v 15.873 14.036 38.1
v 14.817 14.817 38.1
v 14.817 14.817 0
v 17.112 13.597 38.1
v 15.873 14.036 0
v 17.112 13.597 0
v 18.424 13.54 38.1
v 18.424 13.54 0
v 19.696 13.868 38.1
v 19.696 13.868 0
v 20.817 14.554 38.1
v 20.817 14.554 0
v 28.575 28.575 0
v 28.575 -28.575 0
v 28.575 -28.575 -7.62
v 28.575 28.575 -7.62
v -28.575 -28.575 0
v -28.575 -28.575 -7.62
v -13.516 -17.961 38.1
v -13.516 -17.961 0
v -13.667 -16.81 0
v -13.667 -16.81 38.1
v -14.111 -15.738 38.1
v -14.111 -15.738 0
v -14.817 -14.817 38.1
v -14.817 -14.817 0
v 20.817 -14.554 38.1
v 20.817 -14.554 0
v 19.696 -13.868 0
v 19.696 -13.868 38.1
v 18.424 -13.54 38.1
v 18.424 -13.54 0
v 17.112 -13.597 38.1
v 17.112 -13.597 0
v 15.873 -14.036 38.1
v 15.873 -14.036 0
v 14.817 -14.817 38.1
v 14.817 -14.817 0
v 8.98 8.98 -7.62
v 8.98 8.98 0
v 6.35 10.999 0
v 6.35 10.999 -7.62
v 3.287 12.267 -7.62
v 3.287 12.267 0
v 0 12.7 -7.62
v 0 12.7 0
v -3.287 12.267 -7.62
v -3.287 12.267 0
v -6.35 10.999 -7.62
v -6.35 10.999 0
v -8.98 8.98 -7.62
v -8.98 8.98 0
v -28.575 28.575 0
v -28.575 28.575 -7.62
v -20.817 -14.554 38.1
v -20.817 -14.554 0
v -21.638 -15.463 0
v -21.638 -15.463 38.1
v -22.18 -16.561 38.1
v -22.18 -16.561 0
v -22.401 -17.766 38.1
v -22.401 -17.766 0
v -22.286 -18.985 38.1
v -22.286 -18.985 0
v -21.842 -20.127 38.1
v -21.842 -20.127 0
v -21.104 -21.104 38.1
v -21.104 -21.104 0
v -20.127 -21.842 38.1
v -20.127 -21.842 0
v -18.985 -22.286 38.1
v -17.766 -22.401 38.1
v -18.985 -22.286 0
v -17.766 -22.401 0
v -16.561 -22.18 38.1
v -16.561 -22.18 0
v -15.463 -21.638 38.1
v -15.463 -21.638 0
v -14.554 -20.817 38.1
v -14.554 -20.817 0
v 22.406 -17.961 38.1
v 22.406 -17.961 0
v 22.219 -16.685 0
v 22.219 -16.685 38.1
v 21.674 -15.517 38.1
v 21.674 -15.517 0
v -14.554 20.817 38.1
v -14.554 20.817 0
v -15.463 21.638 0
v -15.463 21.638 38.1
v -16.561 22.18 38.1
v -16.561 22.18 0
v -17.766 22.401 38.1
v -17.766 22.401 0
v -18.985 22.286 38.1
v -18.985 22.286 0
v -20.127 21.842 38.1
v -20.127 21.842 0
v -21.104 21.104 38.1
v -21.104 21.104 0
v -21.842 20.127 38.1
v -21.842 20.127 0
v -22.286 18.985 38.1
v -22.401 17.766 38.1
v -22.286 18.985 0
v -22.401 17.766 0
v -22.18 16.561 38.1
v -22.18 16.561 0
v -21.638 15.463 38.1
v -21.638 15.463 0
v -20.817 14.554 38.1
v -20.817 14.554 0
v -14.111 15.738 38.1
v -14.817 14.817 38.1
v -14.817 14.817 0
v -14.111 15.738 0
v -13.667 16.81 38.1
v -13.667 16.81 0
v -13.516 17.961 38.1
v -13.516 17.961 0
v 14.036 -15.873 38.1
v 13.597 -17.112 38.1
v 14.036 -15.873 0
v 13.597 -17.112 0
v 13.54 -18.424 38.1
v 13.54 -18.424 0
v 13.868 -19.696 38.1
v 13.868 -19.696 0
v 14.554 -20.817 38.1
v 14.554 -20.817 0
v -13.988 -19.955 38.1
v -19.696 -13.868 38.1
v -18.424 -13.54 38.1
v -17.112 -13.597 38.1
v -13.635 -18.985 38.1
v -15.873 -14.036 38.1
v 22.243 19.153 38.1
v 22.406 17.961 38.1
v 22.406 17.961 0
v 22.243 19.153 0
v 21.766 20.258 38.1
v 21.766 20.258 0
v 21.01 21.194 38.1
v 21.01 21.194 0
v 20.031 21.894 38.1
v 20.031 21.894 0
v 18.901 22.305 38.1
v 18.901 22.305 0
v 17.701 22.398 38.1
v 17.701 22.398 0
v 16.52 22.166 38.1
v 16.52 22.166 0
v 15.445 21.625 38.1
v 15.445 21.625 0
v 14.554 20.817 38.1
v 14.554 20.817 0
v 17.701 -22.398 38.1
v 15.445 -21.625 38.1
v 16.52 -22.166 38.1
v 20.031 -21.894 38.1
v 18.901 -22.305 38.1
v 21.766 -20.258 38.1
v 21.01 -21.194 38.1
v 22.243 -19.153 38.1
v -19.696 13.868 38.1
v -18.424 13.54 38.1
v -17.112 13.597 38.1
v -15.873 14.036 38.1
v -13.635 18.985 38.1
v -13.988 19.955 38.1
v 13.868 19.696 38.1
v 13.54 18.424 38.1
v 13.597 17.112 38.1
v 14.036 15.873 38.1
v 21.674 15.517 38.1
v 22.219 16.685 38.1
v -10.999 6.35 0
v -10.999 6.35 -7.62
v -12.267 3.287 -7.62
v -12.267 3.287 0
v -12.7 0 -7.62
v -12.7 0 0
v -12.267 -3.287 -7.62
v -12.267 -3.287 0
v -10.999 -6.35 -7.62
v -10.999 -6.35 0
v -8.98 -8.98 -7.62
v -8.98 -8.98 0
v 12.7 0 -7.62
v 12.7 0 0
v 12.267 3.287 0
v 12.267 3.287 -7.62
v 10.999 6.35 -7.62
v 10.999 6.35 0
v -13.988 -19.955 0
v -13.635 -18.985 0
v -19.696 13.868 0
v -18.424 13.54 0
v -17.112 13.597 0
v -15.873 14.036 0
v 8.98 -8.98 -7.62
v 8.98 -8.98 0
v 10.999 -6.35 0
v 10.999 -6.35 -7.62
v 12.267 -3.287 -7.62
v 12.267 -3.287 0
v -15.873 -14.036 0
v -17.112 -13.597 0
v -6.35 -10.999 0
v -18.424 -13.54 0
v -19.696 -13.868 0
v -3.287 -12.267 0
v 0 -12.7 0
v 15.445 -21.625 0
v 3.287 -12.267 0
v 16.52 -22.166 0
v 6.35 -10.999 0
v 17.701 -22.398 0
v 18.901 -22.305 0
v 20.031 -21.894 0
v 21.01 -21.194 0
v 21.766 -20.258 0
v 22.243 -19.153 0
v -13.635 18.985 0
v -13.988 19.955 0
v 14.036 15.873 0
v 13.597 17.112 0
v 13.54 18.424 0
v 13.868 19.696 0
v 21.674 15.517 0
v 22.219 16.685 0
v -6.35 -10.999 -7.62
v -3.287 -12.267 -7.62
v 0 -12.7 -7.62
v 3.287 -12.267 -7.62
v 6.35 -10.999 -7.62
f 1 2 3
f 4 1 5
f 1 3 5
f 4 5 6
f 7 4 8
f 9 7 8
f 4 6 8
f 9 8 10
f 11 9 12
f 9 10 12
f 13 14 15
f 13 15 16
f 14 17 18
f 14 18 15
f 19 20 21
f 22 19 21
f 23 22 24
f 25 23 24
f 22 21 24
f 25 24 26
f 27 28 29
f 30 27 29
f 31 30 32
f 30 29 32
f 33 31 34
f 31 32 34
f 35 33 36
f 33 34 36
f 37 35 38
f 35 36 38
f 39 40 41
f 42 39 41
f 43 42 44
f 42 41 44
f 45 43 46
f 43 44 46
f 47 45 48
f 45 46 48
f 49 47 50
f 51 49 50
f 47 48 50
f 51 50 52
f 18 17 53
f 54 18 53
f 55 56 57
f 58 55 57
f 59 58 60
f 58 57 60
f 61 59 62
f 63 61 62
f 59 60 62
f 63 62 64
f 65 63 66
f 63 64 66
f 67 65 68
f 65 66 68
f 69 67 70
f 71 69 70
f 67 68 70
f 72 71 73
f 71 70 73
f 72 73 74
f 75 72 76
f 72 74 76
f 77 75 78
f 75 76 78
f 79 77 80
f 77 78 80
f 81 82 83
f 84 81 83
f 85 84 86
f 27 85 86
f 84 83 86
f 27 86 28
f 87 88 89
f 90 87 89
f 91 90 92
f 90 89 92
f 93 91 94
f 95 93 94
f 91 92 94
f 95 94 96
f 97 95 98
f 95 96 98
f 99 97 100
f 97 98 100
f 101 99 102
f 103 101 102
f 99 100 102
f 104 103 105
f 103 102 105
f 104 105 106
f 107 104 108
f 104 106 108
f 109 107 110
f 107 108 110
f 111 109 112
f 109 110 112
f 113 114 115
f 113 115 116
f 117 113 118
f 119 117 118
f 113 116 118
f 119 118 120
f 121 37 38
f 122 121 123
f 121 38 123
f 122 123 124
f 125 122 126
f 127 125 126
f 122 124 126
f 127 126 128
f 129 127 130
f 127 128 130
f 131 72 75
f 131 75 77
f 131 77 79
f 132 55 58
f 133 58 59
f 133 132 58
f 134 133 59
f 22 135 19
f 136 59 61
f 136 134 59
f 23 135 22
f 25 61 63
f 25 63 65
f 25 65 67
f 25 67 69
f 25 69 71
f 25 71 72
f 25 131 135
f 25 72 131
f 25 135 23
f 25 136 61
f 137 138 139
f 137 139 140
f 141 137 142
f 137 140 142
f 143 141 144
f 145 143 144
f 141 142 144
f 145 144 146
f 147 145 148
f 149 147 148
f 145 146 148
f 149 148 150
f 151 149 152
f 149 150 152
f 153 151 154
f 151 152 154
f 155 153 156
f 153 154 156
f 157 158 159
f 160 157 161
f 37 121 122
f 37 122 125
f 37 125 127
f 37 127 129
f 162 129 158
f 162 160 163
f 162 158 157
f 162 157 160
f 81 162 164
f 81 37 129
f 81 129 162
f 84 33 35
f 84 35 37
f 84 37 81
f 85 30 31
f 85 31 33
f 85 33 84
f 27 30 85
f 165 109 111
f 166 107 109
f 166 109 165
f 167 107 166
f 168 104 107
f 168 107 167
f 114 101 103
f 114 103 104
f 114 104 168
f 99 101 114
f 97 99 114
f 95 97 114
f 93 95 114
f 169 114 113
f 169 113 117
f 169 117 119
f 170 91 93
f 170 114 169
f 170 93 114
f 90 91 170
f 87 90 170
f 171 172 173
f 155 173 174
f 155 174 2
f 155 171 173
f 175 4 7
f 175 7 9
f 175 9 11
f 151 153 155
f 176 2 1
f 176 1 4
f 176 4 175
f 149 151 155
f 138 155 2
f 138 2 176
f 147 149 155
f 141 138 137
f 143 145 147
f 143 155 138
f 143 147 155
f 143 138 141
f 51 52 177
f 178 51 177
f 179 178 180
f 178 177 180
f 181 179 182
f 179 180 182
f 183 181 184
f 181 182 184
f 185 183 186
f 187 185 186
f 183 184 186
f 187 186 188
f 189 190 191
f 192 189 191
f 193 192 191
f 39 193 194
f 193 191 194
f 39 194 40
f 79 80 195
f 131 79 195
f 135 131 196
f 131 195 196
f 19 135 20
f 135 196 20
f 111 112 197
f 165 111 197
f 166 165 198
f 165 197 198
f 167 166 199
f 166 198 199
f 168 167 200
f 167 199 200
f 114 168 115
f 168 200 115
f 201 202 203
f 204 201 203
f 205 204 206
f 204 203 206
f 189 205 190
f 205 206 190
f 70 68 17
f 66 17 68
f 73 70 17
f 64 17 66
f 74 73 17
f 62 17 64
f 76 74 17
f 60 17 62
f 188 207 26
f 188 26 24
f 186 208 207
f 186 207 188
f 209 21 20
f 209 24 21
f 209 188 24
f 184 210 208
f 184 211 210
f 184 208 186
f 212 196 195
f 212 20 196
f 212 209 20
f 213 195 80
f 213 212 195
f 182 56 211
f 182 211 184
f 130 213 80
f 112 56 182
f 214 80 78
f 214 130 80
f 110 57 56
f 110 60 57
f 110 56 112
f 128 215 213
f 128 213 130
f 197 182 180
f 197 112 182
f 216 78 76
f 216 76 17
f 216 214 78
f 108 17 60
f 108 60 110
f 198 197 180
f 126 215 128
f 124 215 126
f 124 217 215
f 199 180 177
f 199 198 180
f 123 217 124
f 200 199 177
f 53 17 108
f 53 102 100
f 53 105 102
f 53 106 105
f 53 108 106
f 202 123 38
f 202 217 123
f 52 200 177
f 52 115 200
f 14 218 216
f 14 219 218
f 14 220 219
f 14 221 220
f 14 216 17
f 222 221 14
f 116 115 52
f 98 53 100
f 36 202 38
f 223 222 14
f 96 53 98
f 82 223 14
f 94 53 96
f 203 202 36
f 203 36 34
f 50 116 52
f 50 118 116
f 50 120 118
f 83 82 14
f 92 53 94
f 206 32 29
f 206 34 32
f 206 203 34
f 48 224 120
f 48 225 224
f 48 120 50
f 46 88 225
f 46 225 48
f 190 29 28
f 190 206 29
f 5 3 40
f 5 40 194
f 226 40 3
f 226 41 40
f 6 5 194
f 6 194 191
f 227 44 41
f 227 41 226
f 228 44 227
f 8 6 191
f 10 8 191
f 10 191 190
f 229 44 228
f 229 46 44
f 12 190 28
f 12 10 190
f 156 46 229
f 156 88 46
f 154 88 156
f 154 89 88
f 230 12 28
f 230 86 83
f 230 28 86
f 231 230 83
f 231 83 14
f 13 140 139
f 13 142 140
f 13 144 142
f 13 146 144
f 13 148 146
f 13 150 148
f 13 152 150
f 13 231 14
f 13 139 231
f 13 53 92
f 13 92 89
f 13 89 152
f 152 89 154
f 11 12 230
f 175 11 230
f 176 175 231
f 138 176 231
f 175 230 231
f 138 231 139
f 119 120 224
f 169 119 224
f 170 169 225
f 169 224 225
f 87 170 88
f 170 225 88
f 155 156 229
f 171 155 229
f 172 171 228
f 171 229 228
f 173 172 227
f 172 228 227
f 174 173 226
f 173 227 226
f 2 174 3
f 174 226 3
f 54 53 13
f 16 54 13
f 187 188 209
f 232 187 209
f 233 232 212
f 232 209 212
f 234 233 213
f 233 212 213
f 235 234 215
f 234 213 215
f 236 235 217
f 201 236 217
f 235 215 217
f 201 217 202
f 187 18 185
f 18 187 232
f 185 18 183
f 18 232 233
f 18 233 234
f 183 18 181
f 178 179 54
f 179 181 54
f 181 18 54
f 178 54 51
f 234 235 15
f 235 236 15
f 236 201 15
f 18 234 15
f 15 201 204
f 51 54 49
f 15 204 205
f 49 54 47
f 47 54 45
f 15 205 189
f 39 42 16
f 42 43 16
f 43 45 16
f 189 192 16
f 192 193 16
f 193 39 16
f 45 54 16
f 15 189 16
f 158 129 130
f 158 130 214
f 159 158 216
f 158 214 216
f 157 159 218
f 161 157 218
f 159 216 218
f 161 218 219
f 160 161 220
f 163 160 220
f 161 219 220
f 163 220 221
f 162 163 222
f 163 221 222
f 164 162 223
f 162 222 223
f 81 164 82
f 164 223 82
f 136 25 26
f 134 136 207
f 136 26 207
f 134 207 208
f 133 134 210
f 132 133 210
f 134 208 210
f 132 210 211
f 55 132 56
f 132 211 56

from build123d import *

# Parameters (mm, degrees)
F0_W     = 57.15
F0_H     = 57.15
F1_DEPTH = 7.62
F2_DEPTH = 7.62
F3_DEPTH = 38.1


with BuildPart() as f1:
    # F0 (on Top) → F1 (new body)
    with BuildSketch(Plane.XY):
        Rectangle(F0_W, F0_H)
        with BuildLine():
            ThreePointArc((20.8165262819, 14.5544575149), (24.2270485982, 7.6295554405), (25.4, 0))
            ThreePointArc((25.4, 0), (24.2270485982, -7.6295554405), (20.8165262819, -14.5544575149))
            ThreePointArc((20.8165262819, -14.5544575149), (21.9887257051, -16.0812780107), (22.4055122421, -17.9605122421))
            ThreePointArc((22.4055122421, -17.9605122421), (19.4800700294, -22.1377085664), (14.5544575149, -20.8165262819))
            ThreePointArc((14.5544575149, -20.8165262819), (0, -25.4), (-14.5544575149, -20.8165262819))
            ThreePointArc((-14.5544575149, -20.8165262819), (-21.1036018845, -21.1036018845), (-20.8165262819, -14.5544575149))
            ThreePointArc((-20.8165262819, -14.5544575149), (-25.4, 0), (-20.8165262819, 14.5544575149))
            ThreePointArc((-20.8165262819, 14.5544575149), (-21.1036018845, 21.1036018845), (-14.5544575149, 20.8165262819))
            ThreePointArc((-14.5544575149, 20.8165262819), (0, 25.4), (14.5544575149, 20.8165262819))
            ThreePointArc((14.5544575149, 20.8165262819), (19.4800700294, 22.1377085664), (22.4055122421, 17.9605122421))
            ThreePointArc((22.4055122421, 17.9605122421), (21.9887257051, 16.0812780107), (20.8165262819, 14.5544575149))
        make_face(mode=Mode.SUBTRACT)
        with BuildLine():
            ThreePointArc((-8.9802561211, -8.9802561211), (-12.7, 0), (-8.9802561211, 8.9802561211))
            Line((-8.9802561211, 8.9802561211), (-14.8174225998, 14.8174225998))
            ThreePointArc((-14.8174225998, 14.8174225998), (-17.7658567532, 13.5197764652), (-20.8165262819, 14.5544575149))
            ThreePointArc((-20.8165262819, 14.5544575149), (-25.4, 0), (-20.8165262819, -14.5544575149))
            ThreePointArc((-20.8165262819, -14.5544575149), (-17.7658567532, -13.5197764652), (-14.8174225998, -14.8174225998))
            Line((-14.8174225998, -14.8174225998), (-8.9802561211, -8.9802561211))
        make_face()
        with BuildLine():
            ThreePointArc((14.5544575149, -20.8165262819), (13.5197764652, -17.7658567532), (14.8174225998, -14.8174225998))
            Line((14.8174225998, -14.8174225998), (8.9802561211, -8.9802561211))
            ThreePointArc((8.9802561211, -8.9802561211), (0, -12.7), (-8.9802561211, -8.9802561211))
            Line((-8.9802561211, -8.9802561211), (-14.8174225998, -14.8174225998))
            ThreePointArc((-14.8174225998, -14.8174225998), (-13.8538677201, -16.2594843853), (-13.5155122421, -17.9605122421))
            ThreePointArc((-13.5155122421, -17.9605122421), (-13.7833159179, -19.4800700294), (-14.5544575149, -20.8165262819))
            ThreePointArc((-14.5544575149, -20.8165262819), (0, -25.4), (14.5544575149, -20.8165262819))
        make_face()
        with BuildLine():
            ThreePointArc((20.8165262819, -14.5544575149), (24.2270485982, -7.6295554405), (25.4, 0))
            ThreePointArc((25.4, 0), (24.2270485982, 7.6295554405), (20.8165262819, 14.5544575149))
            ThreePointArc((20.8165262819, 14.5544575149), (17.7658567532, 13.5197764652), (14.8174225998, 14.8174225998))
            Line((14.8174225998, 14.8174225998), (8.9802561211, 8.9802561211))
            ThreePointArc((8.9802561211, 8.9802561211), (11.7332700629, 4.860079591), (12.7, 0))
            ThreePointArc((12.7, 0), (11.7332700629, -4.860079591), (8.9802561211, -8.9802561211))
            Line((8.9802561211, -8.9802561211), (14.8174225998, -14.8174225998))
            ThreePointArc((14.8174225998, -14.8174225998), (17.7658567532, -13.5197764652), (20.8165262819, -14.5544575149))
        make_face()
        with BuildLine():
            Line((8.9802561211, 8.9802561211), (14.8174225998, 14.8174225998))
            ThreePointArc((14.8174225998, 14.8174225998), (13.5197764652, 17.7658567532), (14.5544575149, 20.8165262819))
            ThreePointArc((14.5544575149, 20.8165262819), (0, 25.4), (-14.5544575149, 20.8165262819))
            ThreePointArc((-14.5544575149, 20.8165262819), (-13.7833159179, 19.4800700294), (-13.5155122421, 17.9605122421))
            ThreePointArc((-13.5155122421, 17.9605122421), (-13.8538677201, 16.2594843853), (-14.8174225998, 14.8174225998))
            Line((-14.8174225998, 14.8174225998), (-8.9802561211, 8.9802561211))
            ThreePointArc((-8.9802561211, 8.9802561211), (0, 12.7), (8.9802561211, 8.9802561211))
        make_face()
        with BuildLine():
            Line((0, 0), (8.9802561211, 8.9802561211))
            ThreePointArc((8.9802561211, 8.9802561211), (0, 12.7), (-8.9802561211, 8.9802561211))
            Line((-8.9802561211, 8.9802561211), (0, 0))
        make_face()
        with BuildLine():
            ThreePointArc((12.7, 0), (11.7332700629, 4.860079591), (8.9802561211, 8.9802561211))
            Line((8.9802561211, 8.9802561211), (0, 0))
            Line((0, 0), (8.9802561211, -8.9802561211))
            ThreePointArc((8.9802561211, -8.9802561211), (11.7332700629, -4.860079591), (12.7, 0))
        make_face()
        with BuildLine():
            ThreePointArc((-8.9802561211, -8.9802561211), (0, -12.7), (8.9802561211, -8.9802561211))
            Line((8.9802561211, -8.9802561211), (0, 0))
            Line((0, 0), (-8.9802561211, -8.9802561211))
        make_face()
        with BuildLine():
            Line((-8.9802561211, -8.9802561211), (0, 0))
            Line((0, 0), (-8.9802561211, 8.9802561211))
            ThreePointArc((-8.9802561211, 8.9802561211), (-12.7, 0), (-8.9802561211, -8.9802561211))
        make_face()
        with BuildLine():
            ThreePointArc((-20.8165262819, -14.5544575149), (-21.1036018845, -21.1036018845), (-14.5544575149, -20.8165262819))
            ThreePointArc((-14.5544575149, -20.8165262819), (-16.3200802273, -19.4631698697), (-17.9605122421, -17.9605122421))
            ThreePointArc((-17.9605122421, -17.9605122421), (-19.4631698697, -16.3200802273), (-20.8165262819, -14.5544575149))
        make_face()
        with BuildLine():
            ThreePointArc((22.4055122421, -17.9605122421), (21.9887257051, -16.0812780107), (20.8165262819, -14.5544575149))
            ThreePointArc((20.8165262819, -14.5544575149), (19.4631698697, -16.3200802273), (17.9605122421, -17.9605122421))
            ThreePointArc((17.9605122421, -17.9605122421), (16.3200802273, -19.4631698697), (14.5544575149, -20.8165262819))
            ThreePointArc((14.5544575149, -20.8165262819), (19.4800700294, -22.1377085664), (22.4055122421, -17.9605122421))
        make_face()
        with BuildLine():
            ThreePointArc((17.9605122421, 17.9605122421), (19.4631698697, 16.3200802273), (20.8165262819, 14.5544575149))
            ThreePointArc((20.8165262819, 14.5544575149), (21.9887257051, 16.0812780107), (22.4055122421, 17.9605122421))
            ThreePointArc((22.4055122421, 17.9605122421), (19.4800700294, 22.1377085664), (14.5544575149, 20.8165262819))
            ThreePointArc((14.5544575149, 20.8165262819), (16.3200802273, 19.4631698697), (17.9605122421, 17.9605122421))
        make_face()
        with BuildLine():
            ThreePointArc((-17.9605122421, 17.9605122421), (-16.3200802273, 19.4631698697), (-14.5544575149, 20.8165262819))
            ThreePointArc((-14.5544575149, 20.8165262819), (-21.1036018845, 21.1036018845), (-20.8165262819, 14.5544575149))
            ThreePointArc((-20.8165262819, 14.5544575149), (-19.4631698697, 16.3200802273), (-17.9605122421, 17.9605122421))
        make_face()
        with BuildLine():
            ThreePointArc((-17.9605122421, -17.9605122421), (-16.3200802273, -19.4631698697), (-14.5544575149, -20.8165262819))
            ThreePointArc((-14.5544575149, -20.8165262819), (-13.7833159179, -19.4800700294), (-13.5155122421, -17.9605122421))
            ThreePointArc((-13.5155122421, -17.9605122421), (-13.8538677201, -16.2594843853), (-14.8174225998, -14.8174225998))
            Line((-14.8174225998, -14.8174225998), (-17.9605122421, -17.9605122421))
        make_face()
        with BuildLine():
            ThreePointArc((-20.8165262819, -14.5544575149), (-19.4631698697, -16.3200802273), (-17.9605122421, -17.9605122421))
            Line((-17.9605122421, -17.9605122421), (-14.8174225998, -14.8174225998))
            ThreePointArc((-14.8174225998, -14.8174225998), (-17.7658567532, -13.5197764652), (-20.8165262819, -14.5544575149))
        make_face()
        with BuildLine():
            ThreePointArc((14.5544575149, -20.8165262819), (16.3200802273, -19.4631698697), (17.9605122421, -17.9605122421))
            Line((17.9605122421, -17.9605122421), (14.8174225998, -14.8174225998))
            ThreePointArc((14.8174225998, -14.8174225998), (13.5197764652, -17.7658567532), (14.5544575149, -20.8165262819))
        make_face()
        with BuildLine():
            ThreePointArc((17.9605122421, -17.9605122421), (19.4631698697, -16.3200802273), (20.8165262819, -14.5544575149))
            ThreePointArc((20.8165262819, -14.5544575149), (17.7658567532, -13.5197764652), (14.8174225998, -14.8174225998))
            Line((14.8174225998, -14.8174225998), (17.9605122421, -17.9605122421))
        make_face()
        with BuildLine():
            ThreePointArc((14.8174225998, 14.8174225998), (17.7658567532, 13.5197764652), (20.8165262819, 14.5544575149))
            ThreePointArc((20.8165262819, 14.5544575149), (19.4631698697, 16.3200802273), (17.9605122421, 17.9605122421))
            Line((17.9605122421, 17.9605122421), (14.8174225998, 14.8174225998))
        make_face()
        with BuildLine():
            Line((14.8174225998, 14.8174225998), (17.9605122421, 17.9605122421))
            ThreePointArc((17.9605122421, 17.9605122421), (16.3200802273, 19.4631698697), (14.5544575149, 20.8165262819))
            ThreePointArc((14.5544575149, 20.8165262819), (13.5197764652, 17.7658567532), (14.8174225998, 14.8174225998))
        make_face()
        with BuildLine():
            ThreePointArc((-13.5155122421, 17.9605122421), (-13.7833159179, 19.4800700294), (-14.5544575149, 20.8165262819))
            ThreePointArc((-14.5544575149, 20.8165262819), (-16.3200802273, 19.4631698697), (-17.9605122421, 17.9605122421))
            Line((-17.9605122421, 17.9605122421), (-14.8174225998, 14.8174225998))
            ThreePointArc((-14.8174225998, 14.8174225998), (-13.8538677201, 16.2594843853), (-13.5155122421, 17.9605122421))
        make_face()
        with BuildLine():
            Line((-14.8174225998, 14.8174225998), (-17.9605122421, 17.9605122421))
            ThreePointArc((-17.9605122421, 17.9605122421), (-19.4631698697, 16.3200802273), (-20.8165262819, 14.5544575149))
            ThreePointArc((-20.8165262819, 14.5544575149), (-17.7658567532, 13.5197764652), (-14.8174225998, 14.8174225998))
        make_face()
    extrude(amount=-F1_DEPTH)

    # F0 (on Top) → F2 (cut)
    with BuildSketch(Plane.XY):
        with BuildLine():
            ThreePointArc((-8.9802561211, -8.9802561211), (0, -12.7), (8.9802561211, -8.9802561211))
            Line((8.9802561211, -8.9802561211), (0, 0))
            Line((0, 0), (-8.9802561211, -8.9802561211))
        make_face()
        with BuildLine():
            ThreePointArc((12.7, 0), (11.7332700629, 4.860079591), (8.9802561211, 8.9802561211))
            Line((8.9802561211, 8.9802561211), (0, 0))
            Line((0, 0), (8.9802561211, -8.9802561211))
            ThreePointArc((8.9802561211, -8.9802561211), (11.7332700629, -4.860079591), (12.7, 0))
        make_face()
        with BuildLine():
            Line((0, 0), (8.9802561211, 8.9802561211))
            ThreePointArc((8.9802561211, 8.9802561211), (0, 12.7), (-8.9802561211, 8.9802561211))
            Line((-8.9802561211, 8.9802561211), (0, 0))
        make_face()
        with BuildLine():
            Line((-8.9802561211, -8.9802561211), (0, 0))
            Line((0, 0), (-8.9802561211, 8.9802561211))
            ThreePointArc((-8.9802561211, 8.9802561211), (-12.7, 0), (-8.9802561211, -8.9802561211))
        make_face()
    extrude(amount=-F2_DEPTH, mode=Mode.SUBTRACT)

    # F0 (on Top) → F3 (join)
    with BuildSketch(Plane.XY):
        with BuildLine():
            ThreePointArc((-20.8165262819, -14.5544575149), (-21.1036018845, -21.1036018845), (-14.5544575149, -20.8165262819))
            ThreePointArc((-14.5544575149, -20.8165262819), (-16.3200802273, -19.4631698697), (-17.9605122421, -17.9605122421))
            ThreePointArc((-17.9605122421, -17.9605122421), (-19.4631698697, -16.3200802273), (-20.8165262819, -14.5544575149))
        make_face()
        with BuildLine():
            ThreePointArc((-20.8165262819, -14.5544575149), (-19.4631698697, -16.3200802273), (-17.9605122421, -17.9605122421))
            Line((-17.9605122421, -17.9605122421), (-14.8174225998, -14.8174225998))
            ThreePointArc((-14.8174225998, -14.8174225998), (-17.7658567532, -13.5197764652), (-20.8165262819, -14.5544575149))
        make_face()
        with BuildLine():
            ThreePointArc((-17.9605122421, -17.9605122421), (-16.3200802273, -19.4631698697), (-14.5544575149, -20.8165262819))
            ThreePointArc((-14.5544575149, -20.8165262819), (-13.7833159179, -19.4800700294), (-13.5155122421, -17.9605122421))
            ThreePointArc((-13.5155122421, -17.9605122421), (-13.8538677201, -16.2594843853), (-14.8174225998, -14.8174225998))
            Line((-14.8174225998, -14.8174225998), (-17.9605122421, -17.9605122421))
        make_face()
        with BuildLine():
            ThreePointArc((14.5544575149, -20.8165262819), (16.3200802273, -19.4631698697), (17.9605122421, -17.9605122421))
            Line((17.9605122421, -17.9605122421), (14.8174225998, -14.8174225998))
            ThreePointArc((14.8174225998, -14.8174225998), (13.5197764652, -17.7658567532), (14.5544575149, -20.8165262819))
        make_face()
        with BuildLine():
            ThreePointArc((17.9605122421, -17.9605122421), (19.4631698697, -16.3200802273), (20.8165262819, -14.5544575149))
            ThreePointArc((20.8165262819, -14.5544575149), (17.7658567532, -13.5197764652), (14.8174225998, -14.8174225998))
            Line((14.8174225998, -14.8174225998), (17.9605122421, -17.9605122421))
        make_face()
        with BuildLine():
            ThreePointArc((22.4055122421, -17.9605122421), (21.9887257051, -16.0812780107), (20.8165262819, -14.5544575149))
            ThreePointArc((20.8165262819, -14.5544575149), (19.4631698697, -16.3200802273), (17.9605122421, -17.9605122421))
            ThreePointArc((17.9605122421, -17.9605122421), (16.3200802273, -19.4631698697), (14.5544575149, -20.8165262819))
            ThreePointArc((14.5544575149, -20.8165262819), (19.4800700294, -22.1377085664), (22.4055122421, -17.9605122421))
        make_face()
        with BuildLine():
            ThreePointArc((17.9605122421, 17.9605122421), (19.4631698697, 16.3200802273), (20.8165262819, 14.5544575149))
            ThreePointArc((20.8165262819, 14.5544575149), (21.9887257051, 16.0812780107), (22.4055122421, 17.9605122421))
            ThreePointArc((22.4055122421, 17.9605122421), (19.4800700294, 22.1377085664), (14.5544575149, 20.8165262819))
            ThreePointArc((14.5544575149, 20.8165262819), (16.3200802273, 19.4631698697), (17.9605122421, 17.9605122421))
        make_face()
        with BuildLine():
            ThreePointArc((14.8174225998, 14.8174225998), (17.7658567532, 13.5197764652), (20.8165262819, 14.5544575149))
            ThreePointArc((20.8165262819, 14.5544575149), (19.4631698697, 16.3200802273), (17.9605122421, 17.9605122421))
            Line((17.9605122421, 17.9605122421), (14.8174225998, 14.8174225998))
        make_face()
        with BuildLine():
            Line((14.8174225998, 14.8174225998), (17.9605122421, 17.9605122421))
            ThreePointArc((17.9605122421, 17.9605122421), (16.3200802273, 19.4631698697), (14.5544575149, 20.8165262819))
            ThreePointArc((14.5544575149, 20.8165262819), (13.5197764652, 17.7658567532), (14.8174225998, 14.8174225998))
        make_face()
        with BuildLine():
            ThreePointArc((-17.9605122421, 17.9605122421), (-16.3200802273, 19.4631698697), (-14.5544575149, 20.8165262819))
            ThreePointArc((-14.5544575149, 20.8165262819), (-21.1036018845, 21.1036018845), (-20.8165262819, 14.5544575149))
            ThreePointArc((-20.8165262819, 14.5544575149), (-19.4631698697, 16.3200802273), (-17.9605122421, 17.9605122421))
        make_face()
        with BuildLine():
            ThreePointArc((-13.5155122421, 17.9605122421), (-13.7833159179, 19.4800700294), (-14.5544575149, 20.8165262819))
            ThreePointArc((-14.5544575149, 20.8165262819), (-16.3200802273, 19.4631698697), (-17.9605122421, 17.9605122421))
            Line((-17.9605122421, 17.9605122421), (-14.8174225998, 14.8174225998))
            ThreePointArc((-14.8174225998, 14.8174225998), (-13.8538677201, 16.2594843853), (-13.5155122421, 17.9605122421))
        make_face()
        with BuildLine():
            Line((-14.8174225998, 14.8174225998), (-17.9605122421, 17.9605122421))
            ThreePointArc((-17.9605122421, 17.9605122421), (-19.4631698697, 16.3200802273), (-20.8165262819, 14.5544575149))
            ThreePointArc((-20.8165262819, 14.5544575149), (-17.7658567532, 13.5197764652), (-14.8174225998, 14.8174225998))
        make_face()
    extrude(amount=F3_DEPTH)


solid = f1.part
